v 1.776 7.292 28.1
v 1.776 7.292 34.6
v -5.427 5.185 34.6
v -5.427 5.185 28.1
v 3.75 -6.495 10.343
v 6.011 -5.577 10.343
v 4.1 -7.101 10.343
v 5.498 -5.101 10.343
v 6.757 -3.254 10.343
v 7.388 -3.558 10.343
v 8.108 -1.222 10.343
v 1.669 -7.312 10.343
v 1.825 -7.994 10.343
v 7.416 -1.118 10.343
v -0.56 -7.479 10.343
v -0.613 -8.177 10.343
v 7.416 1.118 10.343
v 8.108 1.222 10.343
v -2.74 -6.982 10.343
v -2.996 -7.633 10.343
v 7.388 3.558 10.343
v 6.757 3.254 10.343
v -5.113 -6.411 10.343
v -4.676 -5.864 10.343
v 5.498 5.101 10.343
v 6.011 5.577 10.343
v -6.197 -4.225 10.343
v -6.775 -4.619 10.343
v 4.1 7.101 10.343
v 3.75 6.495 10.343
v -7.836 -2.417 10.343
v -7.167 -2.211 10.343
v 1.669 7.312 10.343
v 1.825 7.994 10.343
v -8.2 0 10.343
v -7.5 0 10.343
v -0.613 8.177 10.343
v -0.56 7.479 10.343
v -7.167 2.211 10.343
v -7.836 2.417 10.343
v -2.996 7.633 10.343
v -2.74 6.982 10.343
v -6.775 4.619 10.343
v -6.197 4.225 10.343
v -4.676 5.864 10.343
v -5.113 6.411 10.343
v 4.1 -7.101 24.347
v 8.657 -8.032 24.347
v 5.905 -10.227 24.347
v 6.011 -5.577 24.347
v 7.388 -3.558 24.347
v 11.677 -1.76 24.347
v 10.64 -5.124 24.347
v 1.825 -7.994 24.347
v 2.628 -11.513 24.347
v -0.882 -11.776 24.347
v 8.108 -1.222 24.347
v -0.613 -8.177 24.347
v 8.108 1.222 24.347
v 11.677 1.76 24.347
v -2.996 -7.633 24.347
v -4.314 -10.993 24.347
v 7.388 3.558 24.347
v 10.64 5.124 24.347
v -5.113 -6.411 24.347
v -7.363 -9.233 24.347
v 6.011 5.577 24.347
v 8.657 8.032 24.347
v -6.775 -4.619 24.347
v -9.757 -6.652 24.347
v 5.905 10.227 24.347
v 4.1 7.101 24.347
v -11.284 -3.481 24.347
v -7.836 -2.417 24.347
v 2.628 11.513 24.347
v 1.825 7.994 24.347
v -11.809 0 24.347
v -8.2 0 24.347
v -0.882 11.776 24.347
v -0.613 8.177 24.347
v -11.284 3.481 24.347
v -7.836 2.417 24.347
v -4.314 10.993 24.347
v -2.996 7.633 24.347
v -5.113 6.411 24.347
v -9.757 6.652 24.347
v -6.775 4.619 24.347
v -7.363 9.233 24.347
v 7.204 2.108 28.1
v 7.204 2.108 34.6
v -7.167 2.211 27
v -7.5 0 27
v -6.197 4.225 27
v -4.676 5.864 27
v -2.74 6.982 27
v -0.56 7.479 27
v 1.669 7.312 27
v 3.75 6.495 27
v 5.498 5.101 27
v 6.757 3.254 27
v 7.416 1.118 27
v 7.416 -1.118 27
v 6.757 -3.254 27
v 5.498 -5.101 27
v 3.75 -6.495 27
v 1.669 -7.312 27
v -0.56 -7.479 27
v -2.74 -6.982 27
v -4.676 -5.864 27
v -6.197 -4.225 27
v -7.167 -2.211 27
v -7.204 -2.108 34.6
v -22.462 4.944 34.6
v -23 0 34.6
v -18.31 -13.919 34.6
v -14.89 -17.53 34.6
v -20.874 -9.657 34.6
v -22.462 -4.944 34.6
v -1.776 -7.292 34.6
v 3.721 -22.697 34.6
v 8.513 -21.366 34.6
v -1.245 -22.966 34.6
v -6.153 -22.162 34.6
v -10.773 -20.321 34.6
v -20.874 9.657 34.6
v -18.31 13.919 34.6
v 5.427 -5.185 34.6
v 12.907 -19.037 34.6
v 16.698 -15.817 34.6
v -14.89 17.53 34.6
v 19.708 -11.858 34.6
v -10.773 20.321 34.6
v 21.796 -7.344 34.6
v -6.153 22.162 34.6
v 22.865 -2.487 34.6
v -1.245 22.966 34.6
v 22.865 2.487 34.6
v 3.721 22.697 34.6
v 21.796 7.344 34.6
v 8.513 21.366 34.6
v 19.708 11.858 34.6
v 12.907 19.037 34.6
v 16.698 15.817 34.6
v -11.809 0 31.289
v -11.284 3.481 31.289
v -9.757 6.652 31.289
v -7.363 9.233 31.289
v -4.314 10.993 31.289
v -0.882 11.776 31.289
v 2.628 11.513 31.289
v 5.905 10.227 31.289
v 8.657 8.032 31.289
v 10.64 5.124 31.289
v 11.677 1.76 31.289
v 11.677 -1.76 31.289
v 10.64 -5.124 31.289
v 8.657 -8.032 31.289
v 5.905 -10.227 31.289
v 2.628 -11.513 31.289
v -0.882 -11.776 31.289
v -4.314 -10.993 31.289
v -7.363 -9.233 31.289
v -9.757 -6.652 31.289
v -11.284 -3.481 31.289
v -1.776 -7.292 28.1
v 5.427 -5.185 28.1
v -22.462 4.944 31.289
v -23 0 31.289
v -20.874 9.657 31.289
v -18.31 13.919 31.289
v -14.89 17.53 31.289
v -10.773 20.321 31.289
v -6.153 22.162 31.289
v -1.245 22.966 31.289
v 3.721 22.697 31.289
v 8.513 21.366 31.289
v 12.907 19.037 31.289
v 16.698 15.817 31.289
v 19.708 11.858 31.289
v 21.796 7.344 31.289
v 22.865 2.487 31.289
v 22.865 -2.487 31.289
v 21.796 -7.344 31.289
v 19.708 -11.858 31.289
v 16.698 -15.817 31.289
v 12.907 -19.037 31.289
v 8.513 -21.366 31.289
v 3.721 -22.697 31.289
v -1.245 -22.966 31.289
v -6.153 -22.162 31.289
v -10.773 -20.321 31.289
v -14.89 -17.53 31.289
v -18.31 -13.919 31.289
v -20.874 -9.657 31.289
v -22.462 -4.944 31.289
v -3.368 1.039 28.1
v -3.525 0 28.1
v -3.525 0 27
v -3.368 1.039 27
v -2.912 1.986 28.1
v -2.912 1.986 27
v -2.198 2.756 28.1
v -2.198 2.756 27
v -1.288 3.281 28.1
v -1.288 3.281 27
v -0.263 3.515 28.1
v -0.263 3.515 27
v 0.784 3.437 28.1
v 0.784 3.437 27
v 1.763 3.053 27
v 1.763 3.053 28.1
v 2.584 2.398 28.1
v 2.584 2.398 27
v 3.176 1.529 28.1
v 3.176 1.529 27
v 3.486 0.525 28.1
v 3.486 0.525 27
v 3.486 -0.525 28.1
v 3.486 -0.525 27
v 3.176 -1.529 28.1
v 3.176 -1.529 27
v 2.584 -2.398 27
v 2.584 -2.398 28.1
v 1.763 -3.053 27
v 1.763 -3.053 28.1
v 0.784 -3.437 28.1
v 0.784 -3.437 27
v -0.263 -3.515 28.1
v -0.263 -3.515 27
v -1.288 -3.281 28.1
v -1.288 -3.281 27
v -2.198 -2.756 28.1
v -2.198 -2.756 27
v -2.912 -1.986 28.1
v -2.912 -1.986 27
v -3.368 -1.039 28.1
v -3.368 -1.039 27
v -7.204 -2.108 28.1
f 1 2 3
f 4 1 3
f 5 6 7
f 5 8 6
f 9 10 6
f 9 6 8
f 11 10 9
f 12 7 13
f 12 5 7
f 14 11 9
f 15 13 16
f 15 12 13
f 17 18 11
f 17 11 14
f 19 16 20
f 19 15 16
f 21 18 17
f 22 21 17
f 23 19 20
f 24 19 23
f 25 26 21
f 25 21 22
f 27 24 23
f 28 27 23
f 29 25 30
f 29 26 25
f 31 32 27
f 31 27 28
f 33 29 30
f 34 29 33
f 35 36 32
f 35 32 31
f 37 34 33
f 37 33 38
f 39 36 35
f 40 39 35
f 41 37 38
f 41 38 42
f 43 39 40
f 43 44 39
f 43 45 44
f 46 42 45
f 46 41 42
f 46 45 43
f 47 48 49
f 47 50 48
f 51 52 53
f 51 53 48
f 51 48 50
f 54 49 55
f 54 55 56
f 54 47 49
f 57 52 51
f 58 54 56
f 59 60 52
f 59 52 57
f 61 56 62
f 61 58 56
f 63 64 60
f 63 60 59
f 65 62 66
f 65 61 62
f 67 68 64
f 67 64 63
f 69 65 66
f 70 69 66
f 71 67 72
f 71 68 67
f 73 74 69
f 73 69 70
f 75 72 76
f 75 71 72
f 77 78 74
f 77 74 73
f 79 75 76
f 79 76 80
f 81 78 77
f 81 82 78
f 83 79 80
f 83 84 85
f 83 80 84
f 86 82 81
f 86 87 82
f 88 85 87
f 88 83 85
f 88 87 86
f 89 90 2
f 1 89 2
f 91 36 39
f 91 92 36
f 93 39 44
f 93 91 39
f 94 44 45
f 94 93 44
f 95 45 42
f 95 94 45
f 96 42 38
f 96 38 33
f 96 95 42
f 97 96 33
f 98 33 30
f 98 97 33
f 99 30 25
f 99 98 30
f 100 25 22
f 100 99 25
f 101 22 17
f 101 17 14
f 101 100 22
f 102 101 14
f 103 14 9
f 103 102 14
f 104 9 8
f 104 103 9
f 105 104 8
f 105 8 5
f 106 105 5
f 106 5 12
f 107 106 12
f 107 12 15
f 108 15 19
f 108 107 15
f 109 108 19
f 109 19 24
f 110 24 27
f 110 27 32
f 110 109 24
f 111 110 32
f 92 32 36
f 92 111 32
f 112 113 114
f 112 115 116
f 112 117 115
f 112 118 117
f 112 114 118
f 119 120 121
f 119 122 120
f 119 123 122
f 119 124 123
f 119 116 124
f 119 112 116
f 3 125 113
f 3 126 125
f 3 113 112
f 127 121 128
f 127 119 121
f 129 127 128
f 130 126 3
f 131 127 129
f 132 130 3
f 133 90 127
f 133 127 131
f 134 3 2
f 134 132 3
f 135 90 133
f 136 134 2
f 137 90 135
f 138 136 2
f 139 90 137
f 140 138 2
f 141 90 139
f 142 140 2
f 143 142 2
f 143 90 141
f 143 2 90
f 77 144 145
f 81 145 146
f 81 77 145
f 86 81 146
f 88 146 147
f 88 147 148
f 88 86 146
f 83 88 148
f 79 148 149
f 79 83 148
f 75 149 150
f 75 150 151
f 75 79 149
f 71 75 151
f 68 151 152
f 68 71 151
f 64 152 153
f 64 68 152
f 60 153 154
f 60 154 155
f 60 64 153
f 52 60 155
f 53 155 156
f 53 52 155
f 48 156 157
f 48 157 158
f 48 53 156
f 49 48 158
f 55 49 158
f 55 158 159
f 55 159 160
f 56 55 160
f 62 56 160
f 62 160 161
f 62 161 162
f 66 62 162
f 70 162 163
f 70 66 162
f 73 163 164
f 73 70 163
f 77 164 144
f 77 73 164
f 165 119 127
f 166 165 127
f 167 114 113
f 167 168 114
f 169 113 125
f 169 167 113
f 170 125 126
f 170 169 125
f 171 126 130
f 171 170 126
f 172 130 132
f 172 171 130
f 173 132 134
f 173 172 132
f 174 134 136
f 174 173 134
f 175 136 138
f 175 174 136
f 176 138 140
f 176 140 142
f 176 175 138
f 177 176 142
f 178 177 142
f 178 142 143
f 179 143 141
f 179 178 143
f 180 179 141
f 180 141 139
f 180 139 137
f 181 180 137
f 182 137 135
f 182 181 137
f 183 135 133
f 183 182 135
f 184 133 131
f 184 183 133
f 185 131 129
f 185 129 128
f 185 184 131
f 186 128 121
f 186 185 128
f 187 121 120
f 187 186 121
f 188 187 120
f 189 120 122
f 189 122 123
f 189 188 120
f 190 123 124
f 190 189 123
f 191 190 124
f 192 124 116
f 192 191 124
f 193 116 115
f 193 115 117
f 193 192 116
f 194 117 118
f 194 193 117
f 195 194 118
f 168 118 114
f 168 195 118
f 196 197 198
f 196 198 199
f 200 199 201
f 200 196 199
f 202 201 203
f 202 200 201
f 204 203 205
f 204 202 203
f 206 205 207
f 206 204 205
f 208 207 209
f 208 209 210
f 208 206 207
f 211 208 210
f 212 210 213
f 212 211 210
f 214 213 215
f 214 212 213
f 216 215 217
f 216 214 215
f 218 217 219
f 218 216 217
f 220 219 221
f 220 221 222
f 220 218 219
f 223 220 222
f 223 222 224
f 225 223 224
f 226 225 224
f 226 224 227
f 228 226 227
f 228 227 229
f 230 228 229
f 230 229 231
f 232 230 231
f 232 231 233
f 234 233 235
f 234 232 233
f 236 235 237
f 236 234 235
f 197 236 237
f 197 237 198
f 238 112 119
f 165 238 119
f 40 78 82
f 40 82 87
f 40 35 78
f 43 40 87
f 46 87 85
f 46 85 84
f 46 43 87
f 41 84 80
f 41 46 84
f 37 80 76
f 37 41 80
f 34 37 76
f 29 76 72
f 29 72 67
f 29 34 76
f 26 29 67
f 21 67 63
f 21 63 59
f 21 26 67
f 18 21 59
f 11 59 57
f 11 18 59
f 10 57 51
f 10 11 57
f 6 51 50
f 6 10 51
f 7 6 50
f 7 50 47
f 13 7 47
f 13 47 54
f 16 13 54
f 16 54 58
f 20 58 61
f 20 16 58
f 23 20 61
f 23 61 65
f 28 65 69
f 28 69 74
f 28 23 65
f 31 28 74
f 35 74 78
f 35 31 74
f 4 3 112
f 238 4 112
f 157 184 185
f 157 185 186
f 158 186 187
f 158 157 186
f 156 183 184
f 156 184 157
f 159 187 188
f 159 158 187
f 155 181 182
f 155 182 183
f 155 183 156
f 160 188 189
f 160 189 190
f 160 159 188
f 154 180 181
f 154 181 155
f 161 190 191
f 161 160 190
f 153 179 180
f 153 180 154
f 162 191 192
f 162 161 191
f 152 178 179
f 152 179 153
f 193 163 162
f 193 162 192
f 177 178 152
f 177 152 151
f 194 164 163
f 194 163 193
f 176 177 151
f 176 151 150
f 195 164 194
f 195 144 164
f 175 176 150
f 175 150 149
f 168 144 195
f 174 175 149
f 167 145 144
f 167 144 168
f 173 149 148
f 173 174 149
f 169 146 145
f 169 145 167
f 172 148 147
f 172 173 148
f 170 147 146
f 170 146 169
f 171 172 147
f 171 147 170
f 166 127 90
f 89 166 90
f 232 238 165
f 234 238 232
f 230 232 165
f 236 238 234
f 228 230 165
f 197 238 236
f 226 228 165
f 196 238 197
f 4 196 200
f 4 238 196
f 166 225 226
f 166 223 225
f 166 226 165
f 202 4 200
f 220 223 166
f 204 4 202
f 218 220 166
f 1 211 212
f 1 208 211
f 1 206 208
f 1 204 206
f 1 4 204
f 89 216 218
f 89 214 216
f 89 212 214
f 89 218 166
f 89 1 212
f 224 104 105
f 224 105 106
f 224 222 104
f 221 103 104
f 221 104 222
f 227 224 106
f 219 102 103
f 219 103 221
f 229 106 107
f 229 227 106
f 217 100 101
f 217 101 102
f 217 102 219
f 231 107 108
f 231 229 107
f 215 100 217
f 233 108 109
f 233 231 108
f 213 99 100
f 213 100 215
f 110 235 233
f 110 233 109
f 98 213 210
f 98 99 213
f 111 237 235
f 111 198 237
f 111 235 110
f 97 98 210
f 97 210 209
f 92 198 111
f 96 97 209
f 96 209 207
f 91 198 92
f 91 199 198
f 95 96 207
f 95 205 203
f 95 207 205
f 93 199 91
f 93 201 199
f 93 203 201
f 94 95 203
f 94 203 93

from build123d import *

# Parameters (mm, degrees)
F0_W     = 0.7
F0_H     = 7.9574310766
F2_R     = 3.525
F3_DEPTH = 6.5


# Not quite as in the source:
# - a feature names something its author has since deleted; it is built from what else it names


with BuildPart() as f1:
    # F0 (on Front) → F1 (revolve)
    with BuildSketch(Plane.XZ):
        Polygon((-8.2, 24.3467036635), (-8.2, 18.3), (-7.5, 18.3), (-7.5, 20.7), (-7.5, 27), (-3.525, 27), (-3.525, 28.3), (-3.525, 34.6), (-23, 34.6), (-23, 31.2892384827), (-11.8090426549, 31.2892384827), (-11.8090426549, 26.945874095), (-11.8090426549, 24.3467036635), align=None)
        with Locations((-7.85, 14.3212844617)):
            Rectangle(F0_W, F0_H)
    revolve(axis=Axis((0, 0, 19.15), (0, 0, -1)))

    # F2 (on face) → F3 (cut)
    with BuildSketch(Plane.XY.offset(34.6)):
        Polygon((-7.2035379805, -2.107693976), (-1.7764524637, -7.2922938762), (5.4270855169, -5.1845999003), (7.2035379805, 2.107693976), (1.7764524637, 7.2922938762), (-5.4270855169, 5.1845999003), align=None)
        Circle(F2_R, mode=Mode.SUBTRACT)
    extrude(amount=-F3_DEPTH, mode=Mode.SUBTRACT)


solid = f1.part
